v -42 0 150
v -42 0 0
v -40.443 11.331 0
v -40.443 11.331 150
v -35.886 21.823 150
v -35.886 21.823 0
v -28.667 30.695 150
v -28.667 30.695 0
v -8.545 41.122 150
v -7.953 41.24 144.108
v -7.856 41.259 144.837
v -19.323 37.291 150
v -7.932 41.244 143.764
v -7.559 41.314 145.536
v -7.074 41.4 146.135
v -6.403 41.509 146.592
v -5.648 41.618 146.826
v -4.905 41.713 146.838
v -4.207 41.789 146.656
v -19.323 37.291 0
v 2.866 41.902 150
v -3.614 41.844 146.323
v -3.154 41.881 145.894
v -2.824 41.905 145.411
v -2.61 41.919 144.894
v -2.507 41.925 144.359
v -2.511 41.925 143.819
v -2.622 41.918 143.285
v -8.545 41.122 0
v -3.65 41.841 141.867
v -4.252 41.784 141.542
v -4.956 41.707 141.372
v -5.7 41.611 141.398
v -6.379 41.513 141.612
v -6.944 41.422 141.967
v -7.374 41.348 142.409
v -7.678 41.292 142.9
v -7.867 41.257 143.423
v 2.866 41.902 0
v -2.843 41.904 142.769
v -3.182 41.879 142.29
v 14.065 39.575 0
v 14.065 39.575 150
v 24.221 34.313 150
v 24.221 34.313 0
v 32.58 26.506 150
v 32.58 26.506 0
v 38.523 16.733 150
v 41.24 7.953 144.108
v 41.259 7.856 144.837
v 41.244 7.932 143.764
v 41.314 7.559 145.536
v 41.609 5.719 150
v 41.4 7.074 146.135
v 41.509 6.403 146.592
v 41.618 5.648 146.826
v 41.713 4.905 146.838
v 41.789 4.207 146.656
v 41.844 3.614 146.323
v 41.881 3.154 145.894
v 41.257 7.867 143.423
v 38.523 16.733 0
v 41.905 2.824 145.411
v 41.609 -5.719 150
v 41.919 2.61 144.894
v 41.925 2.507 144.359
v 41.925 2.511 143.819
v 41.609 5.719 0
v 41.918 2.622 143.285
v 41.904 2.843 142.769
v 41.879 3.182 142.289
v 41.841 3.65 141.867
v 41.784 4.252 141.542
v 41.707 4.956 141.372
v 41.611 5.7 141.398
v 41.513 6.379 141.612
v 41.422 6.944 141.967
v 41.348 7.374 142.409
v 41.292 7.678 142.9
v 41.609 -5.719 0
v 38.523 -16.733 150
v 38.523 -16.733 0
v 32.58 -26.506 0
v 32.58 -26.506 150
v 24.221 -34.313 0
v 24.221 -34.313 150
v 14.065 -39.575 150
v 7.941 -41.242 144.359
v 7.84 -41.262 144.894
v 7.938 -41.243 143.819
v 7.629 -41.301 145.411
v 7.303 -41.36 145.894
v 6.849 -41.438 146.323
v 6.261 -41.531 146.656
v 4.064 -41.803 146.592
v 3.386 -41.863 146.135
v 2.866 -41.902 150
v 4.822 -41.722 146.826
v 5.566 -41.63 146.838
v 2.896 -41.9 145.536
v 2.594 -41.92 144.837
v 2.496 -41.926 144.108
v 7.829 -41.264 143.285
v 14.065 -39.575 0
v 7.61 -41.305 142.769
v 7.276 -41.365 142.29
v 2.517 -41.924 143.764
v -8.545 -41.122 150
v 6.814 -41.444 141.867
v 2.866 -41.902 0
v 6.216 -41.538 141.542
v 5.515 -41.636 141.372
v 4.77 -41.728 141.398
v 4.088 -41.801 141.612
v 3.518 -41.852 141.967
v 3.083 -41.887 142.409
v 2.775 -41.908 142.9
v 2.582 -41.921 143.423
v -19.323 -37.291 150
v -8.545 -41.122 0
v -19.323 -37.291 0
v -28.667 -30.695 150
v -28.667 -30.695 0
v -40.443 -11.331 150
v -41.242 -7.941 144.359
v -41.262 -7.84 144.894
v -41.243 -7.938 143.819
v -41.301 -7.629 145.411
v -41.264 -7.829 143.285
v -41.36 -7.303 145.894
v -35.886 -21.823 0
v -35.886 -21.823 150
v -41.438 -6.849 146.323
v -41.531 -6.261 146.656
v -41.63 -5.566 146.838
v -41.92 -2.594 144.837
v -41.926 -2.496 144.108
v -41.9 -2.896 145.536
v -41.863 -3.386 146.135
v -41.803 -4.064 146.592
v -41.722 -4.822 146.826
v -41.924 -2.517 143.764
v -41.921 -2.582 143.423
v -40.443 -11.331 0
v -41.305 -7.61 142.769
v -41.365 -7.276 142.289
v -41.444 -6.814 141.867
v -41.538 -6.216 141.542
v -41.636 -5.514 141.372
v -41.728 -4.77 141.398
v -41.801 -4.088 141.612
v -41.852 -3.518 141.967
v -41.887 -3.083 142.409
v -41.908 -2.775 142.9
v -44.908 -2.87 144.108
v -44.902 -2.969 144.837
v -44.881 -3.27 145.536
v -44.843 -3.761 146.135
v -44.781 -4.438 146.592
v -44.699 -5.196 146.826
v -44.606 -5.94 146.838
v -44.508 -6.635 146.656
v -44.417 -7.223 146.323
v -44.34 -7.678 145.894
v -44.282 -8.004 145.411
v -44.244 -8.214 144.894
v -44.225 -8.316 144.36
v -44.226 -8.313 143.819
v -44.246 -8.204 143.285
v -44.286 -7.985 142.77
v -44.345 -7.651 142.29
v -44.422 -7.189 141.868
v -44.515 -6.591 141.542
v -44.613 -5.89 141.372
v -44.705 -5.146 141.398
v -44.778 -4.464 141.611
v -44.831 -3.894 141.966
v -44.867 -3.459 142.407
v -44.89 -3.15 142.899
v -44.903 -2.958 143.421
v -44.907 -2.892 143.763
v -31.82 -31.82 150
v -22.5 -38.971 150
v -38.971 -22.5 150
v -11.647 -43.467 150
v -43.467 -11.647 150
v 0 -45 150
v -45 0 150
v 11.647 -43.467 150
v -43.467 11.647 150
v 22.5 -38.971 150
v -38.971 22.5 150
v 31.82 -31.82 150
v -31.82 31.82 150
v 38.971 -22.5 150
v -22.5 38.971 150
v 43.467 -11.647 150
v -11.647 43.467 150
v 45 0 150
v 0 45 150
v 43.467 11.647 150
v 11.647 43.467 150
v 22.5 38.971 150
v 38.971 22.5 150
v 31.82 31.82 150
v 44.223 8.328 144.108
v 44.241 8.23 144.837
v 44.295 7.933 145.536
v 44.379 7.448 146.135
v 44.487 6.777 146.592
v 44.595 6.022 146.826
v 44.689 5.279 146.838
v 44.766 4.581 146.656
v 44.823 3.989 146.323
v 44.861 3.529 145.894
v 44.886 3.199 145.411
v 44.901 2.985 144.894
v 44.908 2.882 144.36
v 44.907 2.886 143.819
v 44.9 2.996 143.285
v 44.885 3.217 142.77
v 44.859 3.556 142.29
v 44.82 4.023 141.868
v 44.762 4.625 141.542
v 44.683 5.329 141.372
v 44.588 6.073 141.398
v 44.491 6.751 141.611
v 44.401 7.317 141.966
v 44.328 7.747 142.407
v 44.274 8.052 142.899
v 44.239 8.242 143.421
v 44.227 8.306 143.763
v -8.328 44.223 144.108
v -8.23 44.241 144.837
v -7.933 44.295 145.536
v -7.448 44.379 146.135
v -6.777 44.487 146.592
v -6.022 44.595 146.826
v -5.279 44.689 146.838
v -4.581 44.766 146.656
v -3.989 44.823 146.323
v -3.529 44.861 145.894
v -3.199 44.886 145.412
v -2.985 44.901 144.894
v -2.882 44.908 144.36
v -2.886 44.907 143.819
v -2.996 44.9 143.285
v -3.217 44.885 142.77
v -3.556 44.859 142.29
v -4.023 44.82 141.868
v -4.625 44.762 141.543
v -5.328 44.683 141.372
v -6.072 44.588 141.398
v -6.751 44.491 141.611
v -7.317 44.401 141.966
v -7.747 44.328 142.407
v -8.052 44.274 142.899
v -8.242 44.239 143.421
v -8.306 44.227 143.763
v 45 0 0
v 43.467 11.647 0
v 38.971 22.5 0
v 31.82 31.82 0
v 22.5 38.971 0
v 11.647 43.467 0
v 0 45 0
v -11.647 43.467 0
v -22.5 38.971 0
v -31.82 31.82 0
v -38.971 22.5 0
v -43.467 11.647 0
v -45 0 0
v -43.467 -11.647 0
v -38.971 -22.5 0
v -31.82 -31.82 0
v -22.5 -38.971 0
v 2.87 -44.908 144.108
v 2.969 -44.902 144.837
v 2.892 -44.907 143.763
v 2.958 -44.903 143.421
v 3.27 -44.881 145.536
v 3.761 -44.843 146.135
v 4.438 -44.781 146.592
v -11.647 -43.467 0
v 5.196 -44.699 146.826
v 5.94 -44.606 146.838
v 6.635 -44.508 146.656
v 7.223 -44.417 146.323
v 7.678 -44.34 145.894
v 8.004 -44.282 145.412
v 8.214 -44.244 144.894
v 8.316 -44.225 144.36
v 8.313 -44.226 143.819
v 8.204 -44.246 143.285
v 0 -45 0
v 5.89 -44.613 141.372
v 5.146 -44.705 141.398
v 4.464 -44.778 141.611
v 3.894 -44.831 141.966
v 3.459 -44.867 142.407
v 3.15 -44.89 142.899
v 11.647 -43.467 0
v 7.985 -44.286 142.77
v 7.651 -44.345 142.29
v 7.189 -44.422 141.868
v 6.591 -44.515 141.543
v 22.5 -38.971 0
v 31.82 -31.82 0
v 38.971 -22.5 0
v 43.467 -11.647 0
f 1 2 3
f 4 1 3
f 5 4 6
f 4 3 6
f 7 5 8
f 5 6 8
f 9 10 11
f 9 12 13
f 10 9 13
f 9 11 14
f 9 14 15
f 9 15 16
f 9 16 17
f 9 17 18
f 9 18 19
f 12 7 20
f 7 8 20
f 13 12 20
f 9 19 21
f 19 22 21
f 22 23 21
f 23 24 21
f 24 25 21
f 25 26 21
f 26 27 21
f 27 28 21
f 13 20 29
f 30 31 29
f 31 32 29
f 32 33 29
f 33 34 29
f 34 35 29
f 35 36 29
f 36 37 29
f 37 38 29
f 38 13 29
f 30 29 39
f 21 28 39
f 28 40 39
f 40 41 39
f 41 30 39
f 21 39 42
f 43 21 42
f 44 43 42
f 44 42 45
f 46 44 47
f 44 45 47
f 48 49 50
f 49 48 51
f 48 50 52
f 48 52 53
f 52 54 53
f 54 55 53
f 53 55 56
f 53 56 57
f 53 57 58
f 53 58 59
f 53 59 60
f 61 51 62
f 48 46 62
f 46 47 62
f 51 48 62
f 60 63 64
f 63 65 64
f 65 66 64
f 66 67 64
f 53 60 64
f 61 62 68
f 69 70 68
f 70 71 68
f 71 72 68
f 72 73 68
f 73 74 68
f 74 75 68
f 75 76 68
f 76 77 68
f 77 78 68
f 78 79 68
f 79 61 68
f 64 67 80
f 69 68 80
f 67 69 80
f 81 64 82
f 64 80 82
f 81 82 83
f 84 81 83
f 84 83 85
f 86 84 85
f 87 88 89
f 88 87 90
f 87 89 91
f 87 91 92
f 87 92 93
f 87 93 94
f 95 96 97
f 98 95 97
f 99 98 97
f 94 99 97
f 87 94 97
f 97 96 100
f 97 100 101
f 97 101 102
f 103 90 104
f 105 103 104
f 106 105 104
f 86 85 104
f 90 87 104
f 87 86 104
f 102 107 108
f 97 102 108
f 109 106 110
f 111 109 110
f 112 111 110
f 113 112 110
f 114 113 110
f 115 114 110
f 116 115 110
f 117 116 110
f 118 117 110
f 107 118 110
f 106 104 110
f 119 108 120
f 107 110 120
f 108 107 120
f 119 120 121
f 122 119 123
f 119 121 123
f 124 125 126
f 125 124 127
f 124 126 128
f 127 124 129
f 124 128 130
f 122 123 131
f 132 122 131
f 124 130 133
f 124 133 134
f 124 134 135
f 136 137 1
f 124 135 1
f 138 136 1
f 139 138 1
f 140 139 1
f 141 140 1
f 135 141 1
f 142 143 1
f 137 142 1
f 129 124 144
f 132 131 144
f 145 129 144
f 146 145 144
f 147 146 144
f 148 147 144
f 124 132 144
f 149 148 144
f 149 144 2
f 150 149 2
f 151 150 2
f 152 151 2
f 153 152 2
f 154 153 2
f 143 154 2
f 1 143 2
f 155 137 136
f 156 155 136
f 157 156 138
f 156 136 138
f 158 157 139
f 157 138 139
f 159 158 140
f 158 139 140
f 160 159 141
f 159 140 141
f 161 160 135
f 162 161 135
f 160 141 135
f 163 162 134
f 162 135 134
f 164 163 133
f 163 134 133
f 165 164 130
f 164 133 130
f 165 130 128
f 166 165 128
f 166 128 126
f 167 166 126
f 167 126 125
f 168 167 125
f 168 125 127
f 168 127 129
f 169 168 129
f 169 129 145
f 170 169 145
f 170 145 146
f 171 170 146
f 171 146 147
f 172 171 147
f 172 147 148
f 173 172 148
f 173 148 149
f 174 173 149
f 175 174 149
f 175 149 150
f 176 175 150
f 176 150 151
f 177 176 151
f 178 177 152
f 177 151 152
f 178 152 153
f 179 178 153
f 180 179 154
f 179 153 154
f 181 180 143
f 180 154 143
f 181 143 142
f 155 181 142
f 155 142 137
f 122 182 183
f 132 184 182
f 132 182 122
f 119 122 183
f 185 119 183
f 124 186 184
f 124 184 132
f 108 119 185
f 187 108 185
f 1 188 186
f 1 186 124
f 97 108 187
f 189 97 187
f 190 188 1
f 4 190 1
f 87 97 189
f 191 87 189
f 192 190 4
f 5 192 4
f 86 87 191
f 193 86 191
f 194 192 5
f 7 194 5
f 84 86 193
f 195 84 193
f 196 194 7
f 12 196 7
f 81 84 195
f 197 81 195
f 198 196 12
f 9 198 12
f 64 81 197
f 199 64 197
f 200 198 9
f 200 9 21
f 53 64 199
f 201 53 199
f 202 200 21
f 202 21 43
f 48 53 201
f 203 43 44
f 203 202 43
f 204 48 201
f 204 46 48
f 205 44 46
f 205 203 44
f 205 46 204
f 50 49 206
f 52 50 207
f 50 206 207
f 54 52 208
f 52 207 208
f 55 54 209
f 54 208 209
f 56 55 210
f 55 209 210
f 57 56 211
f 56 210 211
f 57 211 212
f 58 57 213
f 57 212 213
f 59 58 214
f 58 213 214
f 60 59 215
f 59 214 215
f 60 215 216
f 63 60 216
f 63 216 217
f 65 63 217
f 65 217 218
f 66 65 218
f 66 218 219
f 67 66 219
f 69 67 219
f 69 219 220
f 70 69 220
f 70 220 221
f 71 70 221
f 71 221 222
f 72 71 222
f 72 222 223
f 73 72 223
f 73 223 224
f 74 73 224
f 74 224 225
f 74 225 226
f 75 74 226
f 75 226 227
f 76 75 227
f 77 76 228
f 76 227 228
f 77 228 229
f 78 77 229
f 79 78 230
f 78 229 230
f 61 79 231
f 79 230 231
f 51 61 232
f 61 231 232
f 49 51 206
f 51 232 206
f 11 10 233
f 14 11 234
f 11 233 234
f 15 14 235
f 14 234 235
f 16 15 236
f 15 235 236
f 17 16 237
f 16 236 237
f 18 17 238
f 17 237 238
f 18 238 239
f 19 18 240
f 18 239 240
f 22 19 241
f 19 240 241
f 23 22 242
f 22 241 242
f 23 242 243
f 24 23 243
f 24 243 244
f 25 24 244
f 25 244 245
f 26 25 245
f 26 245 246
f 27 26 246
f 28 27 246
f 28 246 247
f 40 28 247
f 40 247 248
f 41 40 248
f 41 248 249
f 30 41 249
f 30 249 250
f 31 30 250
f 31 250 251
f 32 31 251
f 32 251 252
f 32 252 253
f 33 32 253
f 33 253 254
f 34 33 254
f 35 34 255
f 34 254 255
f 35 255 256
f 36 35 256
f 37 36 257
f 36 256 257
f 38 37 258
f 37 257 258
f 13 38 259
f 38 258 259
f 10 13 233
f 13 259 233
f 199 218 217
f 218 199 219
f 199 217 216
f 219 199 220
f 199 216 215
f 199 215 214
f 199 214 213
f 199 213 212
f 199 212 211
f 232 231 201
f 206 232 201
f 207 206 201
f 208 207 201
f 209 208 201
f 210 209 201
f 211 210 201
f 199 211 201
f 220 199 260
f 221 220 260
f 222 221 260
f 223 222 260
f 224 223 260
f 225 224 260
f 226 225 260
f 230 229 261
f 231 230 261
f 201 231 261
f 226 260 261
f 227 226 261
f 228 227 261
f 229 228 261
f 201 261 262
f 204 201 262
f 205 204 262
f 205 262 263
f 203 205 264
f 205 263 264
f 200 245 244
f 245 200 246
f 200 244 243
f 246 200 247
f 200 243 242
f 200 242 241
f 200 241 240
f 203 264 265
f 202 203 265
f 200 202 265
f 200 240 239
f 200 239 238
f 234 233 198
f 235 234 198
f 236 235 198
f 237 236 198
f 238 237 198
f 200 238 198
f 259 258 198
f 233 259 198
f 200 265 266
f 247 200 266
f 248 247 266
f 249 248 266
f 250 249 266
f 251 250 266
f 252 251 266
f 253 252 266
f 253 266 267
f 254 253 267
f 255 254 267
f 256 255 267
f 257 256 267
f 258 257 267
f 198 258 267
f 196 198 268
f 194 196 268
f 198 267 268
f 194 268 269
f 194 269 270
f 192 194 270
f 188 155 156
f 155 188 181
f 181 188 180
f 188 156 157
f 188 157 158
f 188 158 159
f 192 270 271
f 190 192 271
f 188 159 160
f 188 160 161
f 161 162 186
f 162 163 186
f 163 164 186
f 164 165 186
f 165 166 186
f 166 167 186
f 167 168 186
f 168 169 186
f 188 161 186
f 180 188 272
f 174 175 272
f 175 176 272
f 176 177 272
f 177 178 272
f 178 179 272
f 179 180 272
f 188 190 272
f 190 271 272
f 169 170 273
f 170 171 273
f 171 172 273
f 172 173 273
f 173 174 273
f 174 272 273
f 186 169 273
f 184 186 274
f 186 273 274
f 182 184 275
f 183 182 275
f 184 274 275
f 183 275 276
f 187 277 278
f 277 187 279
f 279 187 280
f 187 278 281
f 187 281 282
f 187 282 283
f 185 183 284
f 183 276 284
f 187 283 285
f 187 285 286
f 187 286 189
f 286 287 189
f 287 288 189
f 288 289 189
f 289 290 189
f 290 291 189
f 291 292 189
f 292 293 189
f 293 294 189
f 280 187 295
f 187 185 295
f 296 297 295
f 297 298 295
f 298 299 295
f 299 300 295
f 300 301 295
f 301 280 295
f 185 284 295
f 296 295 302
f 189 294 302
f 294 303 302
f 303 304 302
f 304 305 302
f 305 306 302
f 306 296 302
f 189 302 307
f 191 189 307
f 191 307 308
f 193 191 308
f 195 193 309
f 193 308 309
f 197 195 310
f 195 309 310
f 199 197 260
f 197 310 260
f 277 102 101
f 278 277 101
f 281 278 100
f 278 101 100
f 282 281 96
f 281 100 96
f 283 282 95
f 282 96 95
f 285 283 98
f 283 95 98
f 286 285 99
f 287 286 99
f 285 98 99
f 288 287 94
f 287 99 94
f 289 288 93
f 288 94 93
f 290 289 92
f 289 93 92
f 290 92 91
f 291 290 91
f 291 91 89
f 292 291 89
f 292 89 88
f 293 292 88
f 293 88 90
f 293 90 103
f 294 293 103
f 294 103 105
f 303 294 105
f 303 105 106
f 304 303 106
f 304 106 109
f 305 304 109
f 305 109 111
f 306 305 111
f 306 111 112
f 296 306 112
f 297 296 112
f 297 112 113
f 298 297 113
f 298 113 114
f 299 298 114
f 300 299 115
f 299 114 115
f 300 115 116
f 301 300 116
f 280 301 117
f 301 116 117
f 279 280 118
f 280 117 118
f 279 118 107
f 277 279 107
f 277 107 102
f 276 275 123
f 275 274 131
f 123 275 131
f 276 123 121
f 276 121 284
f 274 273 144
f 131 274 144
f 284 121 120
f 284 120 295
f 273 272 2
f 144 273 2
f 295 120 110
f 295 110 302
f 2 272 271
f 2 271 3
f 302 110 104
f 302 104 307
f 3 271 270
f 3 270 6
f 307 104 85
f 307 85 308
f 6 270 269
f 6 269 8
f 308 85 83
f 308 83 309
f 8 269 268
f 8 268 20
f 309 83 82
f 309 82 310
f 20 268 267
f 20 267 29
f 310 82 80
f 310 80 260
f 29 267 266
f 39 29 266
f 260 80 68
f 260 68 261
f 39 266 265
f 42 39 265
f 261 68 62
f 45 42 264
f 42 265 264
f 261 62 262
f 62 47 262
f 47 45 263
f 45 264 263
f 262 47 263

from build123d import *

# Parameters (mm, degrees)
ESQUISSE1_R                  = 45
BOSS_EXTRU_1_DEPTH           = 150
ESQUISSE2_R                  = 42
ENL_V_MAT_EXTRU_1_DEPTH      = 150
D_GAGEMENT_M51_D             = 5.5
R_P_TITION_CIRCULAIRE1_COUNT = 2
R_P_TITION_CIRCULAIRE1_ANGLE = 90


with BuildPart() as part:
    # Esquisse1 → Boss.-Extru.1 (new body)
    with BuildSketch(Plane.XY):
        Circle(ESQUISSE1_R)
    extrude(amount=BOSS_EXTRU_1_DEPTH)

    # Esquisse2 → Enlèv. mat.-Extru.1 (cut)
    with BuildSketch(Plane(origin=(0, 0, 0), x_dir=(-1, 0, 0), z_dir=(0, 0, -1))):
        Circle(ESQUISSE2_R)
    extrude(amount=-ENL_V_MAT_EXTRU_1_DEPTH, mode=Mode.SUBTRACT)

    # Dégagement M51 (through all)
    with Locations(Plane(origin=(-44.649010523, -5.609443765, 144.107816194), x_dir=(0.124654306, -0.992200234, 0), z_dir=(-0.992200234, -0.124654306, 0))):
        with Locations((0, 0)):
            d_gagement_m51 = Hole(D_GAGEMENT_M51_D / 2)

    # Répétition circulaire1: Dégagement M51 ×2 about axis
    r_p_tition_circulaire1_axis = Axis((0, 0, 0), (0, 0, 1))
    for i in range(1, R_P_TITION_CIRCULAIRE1_COUNT):
        add(d_gagement_m51.rotate(r_p_tition_circulaire1_axis, i * R_P_TITION_CIRCULAIRE1_ANGLE / (R_P_TITION_CIRCULAIRE1_COUNT - 1)), mode=Mode.SUBTRACT)


solid = part.part
